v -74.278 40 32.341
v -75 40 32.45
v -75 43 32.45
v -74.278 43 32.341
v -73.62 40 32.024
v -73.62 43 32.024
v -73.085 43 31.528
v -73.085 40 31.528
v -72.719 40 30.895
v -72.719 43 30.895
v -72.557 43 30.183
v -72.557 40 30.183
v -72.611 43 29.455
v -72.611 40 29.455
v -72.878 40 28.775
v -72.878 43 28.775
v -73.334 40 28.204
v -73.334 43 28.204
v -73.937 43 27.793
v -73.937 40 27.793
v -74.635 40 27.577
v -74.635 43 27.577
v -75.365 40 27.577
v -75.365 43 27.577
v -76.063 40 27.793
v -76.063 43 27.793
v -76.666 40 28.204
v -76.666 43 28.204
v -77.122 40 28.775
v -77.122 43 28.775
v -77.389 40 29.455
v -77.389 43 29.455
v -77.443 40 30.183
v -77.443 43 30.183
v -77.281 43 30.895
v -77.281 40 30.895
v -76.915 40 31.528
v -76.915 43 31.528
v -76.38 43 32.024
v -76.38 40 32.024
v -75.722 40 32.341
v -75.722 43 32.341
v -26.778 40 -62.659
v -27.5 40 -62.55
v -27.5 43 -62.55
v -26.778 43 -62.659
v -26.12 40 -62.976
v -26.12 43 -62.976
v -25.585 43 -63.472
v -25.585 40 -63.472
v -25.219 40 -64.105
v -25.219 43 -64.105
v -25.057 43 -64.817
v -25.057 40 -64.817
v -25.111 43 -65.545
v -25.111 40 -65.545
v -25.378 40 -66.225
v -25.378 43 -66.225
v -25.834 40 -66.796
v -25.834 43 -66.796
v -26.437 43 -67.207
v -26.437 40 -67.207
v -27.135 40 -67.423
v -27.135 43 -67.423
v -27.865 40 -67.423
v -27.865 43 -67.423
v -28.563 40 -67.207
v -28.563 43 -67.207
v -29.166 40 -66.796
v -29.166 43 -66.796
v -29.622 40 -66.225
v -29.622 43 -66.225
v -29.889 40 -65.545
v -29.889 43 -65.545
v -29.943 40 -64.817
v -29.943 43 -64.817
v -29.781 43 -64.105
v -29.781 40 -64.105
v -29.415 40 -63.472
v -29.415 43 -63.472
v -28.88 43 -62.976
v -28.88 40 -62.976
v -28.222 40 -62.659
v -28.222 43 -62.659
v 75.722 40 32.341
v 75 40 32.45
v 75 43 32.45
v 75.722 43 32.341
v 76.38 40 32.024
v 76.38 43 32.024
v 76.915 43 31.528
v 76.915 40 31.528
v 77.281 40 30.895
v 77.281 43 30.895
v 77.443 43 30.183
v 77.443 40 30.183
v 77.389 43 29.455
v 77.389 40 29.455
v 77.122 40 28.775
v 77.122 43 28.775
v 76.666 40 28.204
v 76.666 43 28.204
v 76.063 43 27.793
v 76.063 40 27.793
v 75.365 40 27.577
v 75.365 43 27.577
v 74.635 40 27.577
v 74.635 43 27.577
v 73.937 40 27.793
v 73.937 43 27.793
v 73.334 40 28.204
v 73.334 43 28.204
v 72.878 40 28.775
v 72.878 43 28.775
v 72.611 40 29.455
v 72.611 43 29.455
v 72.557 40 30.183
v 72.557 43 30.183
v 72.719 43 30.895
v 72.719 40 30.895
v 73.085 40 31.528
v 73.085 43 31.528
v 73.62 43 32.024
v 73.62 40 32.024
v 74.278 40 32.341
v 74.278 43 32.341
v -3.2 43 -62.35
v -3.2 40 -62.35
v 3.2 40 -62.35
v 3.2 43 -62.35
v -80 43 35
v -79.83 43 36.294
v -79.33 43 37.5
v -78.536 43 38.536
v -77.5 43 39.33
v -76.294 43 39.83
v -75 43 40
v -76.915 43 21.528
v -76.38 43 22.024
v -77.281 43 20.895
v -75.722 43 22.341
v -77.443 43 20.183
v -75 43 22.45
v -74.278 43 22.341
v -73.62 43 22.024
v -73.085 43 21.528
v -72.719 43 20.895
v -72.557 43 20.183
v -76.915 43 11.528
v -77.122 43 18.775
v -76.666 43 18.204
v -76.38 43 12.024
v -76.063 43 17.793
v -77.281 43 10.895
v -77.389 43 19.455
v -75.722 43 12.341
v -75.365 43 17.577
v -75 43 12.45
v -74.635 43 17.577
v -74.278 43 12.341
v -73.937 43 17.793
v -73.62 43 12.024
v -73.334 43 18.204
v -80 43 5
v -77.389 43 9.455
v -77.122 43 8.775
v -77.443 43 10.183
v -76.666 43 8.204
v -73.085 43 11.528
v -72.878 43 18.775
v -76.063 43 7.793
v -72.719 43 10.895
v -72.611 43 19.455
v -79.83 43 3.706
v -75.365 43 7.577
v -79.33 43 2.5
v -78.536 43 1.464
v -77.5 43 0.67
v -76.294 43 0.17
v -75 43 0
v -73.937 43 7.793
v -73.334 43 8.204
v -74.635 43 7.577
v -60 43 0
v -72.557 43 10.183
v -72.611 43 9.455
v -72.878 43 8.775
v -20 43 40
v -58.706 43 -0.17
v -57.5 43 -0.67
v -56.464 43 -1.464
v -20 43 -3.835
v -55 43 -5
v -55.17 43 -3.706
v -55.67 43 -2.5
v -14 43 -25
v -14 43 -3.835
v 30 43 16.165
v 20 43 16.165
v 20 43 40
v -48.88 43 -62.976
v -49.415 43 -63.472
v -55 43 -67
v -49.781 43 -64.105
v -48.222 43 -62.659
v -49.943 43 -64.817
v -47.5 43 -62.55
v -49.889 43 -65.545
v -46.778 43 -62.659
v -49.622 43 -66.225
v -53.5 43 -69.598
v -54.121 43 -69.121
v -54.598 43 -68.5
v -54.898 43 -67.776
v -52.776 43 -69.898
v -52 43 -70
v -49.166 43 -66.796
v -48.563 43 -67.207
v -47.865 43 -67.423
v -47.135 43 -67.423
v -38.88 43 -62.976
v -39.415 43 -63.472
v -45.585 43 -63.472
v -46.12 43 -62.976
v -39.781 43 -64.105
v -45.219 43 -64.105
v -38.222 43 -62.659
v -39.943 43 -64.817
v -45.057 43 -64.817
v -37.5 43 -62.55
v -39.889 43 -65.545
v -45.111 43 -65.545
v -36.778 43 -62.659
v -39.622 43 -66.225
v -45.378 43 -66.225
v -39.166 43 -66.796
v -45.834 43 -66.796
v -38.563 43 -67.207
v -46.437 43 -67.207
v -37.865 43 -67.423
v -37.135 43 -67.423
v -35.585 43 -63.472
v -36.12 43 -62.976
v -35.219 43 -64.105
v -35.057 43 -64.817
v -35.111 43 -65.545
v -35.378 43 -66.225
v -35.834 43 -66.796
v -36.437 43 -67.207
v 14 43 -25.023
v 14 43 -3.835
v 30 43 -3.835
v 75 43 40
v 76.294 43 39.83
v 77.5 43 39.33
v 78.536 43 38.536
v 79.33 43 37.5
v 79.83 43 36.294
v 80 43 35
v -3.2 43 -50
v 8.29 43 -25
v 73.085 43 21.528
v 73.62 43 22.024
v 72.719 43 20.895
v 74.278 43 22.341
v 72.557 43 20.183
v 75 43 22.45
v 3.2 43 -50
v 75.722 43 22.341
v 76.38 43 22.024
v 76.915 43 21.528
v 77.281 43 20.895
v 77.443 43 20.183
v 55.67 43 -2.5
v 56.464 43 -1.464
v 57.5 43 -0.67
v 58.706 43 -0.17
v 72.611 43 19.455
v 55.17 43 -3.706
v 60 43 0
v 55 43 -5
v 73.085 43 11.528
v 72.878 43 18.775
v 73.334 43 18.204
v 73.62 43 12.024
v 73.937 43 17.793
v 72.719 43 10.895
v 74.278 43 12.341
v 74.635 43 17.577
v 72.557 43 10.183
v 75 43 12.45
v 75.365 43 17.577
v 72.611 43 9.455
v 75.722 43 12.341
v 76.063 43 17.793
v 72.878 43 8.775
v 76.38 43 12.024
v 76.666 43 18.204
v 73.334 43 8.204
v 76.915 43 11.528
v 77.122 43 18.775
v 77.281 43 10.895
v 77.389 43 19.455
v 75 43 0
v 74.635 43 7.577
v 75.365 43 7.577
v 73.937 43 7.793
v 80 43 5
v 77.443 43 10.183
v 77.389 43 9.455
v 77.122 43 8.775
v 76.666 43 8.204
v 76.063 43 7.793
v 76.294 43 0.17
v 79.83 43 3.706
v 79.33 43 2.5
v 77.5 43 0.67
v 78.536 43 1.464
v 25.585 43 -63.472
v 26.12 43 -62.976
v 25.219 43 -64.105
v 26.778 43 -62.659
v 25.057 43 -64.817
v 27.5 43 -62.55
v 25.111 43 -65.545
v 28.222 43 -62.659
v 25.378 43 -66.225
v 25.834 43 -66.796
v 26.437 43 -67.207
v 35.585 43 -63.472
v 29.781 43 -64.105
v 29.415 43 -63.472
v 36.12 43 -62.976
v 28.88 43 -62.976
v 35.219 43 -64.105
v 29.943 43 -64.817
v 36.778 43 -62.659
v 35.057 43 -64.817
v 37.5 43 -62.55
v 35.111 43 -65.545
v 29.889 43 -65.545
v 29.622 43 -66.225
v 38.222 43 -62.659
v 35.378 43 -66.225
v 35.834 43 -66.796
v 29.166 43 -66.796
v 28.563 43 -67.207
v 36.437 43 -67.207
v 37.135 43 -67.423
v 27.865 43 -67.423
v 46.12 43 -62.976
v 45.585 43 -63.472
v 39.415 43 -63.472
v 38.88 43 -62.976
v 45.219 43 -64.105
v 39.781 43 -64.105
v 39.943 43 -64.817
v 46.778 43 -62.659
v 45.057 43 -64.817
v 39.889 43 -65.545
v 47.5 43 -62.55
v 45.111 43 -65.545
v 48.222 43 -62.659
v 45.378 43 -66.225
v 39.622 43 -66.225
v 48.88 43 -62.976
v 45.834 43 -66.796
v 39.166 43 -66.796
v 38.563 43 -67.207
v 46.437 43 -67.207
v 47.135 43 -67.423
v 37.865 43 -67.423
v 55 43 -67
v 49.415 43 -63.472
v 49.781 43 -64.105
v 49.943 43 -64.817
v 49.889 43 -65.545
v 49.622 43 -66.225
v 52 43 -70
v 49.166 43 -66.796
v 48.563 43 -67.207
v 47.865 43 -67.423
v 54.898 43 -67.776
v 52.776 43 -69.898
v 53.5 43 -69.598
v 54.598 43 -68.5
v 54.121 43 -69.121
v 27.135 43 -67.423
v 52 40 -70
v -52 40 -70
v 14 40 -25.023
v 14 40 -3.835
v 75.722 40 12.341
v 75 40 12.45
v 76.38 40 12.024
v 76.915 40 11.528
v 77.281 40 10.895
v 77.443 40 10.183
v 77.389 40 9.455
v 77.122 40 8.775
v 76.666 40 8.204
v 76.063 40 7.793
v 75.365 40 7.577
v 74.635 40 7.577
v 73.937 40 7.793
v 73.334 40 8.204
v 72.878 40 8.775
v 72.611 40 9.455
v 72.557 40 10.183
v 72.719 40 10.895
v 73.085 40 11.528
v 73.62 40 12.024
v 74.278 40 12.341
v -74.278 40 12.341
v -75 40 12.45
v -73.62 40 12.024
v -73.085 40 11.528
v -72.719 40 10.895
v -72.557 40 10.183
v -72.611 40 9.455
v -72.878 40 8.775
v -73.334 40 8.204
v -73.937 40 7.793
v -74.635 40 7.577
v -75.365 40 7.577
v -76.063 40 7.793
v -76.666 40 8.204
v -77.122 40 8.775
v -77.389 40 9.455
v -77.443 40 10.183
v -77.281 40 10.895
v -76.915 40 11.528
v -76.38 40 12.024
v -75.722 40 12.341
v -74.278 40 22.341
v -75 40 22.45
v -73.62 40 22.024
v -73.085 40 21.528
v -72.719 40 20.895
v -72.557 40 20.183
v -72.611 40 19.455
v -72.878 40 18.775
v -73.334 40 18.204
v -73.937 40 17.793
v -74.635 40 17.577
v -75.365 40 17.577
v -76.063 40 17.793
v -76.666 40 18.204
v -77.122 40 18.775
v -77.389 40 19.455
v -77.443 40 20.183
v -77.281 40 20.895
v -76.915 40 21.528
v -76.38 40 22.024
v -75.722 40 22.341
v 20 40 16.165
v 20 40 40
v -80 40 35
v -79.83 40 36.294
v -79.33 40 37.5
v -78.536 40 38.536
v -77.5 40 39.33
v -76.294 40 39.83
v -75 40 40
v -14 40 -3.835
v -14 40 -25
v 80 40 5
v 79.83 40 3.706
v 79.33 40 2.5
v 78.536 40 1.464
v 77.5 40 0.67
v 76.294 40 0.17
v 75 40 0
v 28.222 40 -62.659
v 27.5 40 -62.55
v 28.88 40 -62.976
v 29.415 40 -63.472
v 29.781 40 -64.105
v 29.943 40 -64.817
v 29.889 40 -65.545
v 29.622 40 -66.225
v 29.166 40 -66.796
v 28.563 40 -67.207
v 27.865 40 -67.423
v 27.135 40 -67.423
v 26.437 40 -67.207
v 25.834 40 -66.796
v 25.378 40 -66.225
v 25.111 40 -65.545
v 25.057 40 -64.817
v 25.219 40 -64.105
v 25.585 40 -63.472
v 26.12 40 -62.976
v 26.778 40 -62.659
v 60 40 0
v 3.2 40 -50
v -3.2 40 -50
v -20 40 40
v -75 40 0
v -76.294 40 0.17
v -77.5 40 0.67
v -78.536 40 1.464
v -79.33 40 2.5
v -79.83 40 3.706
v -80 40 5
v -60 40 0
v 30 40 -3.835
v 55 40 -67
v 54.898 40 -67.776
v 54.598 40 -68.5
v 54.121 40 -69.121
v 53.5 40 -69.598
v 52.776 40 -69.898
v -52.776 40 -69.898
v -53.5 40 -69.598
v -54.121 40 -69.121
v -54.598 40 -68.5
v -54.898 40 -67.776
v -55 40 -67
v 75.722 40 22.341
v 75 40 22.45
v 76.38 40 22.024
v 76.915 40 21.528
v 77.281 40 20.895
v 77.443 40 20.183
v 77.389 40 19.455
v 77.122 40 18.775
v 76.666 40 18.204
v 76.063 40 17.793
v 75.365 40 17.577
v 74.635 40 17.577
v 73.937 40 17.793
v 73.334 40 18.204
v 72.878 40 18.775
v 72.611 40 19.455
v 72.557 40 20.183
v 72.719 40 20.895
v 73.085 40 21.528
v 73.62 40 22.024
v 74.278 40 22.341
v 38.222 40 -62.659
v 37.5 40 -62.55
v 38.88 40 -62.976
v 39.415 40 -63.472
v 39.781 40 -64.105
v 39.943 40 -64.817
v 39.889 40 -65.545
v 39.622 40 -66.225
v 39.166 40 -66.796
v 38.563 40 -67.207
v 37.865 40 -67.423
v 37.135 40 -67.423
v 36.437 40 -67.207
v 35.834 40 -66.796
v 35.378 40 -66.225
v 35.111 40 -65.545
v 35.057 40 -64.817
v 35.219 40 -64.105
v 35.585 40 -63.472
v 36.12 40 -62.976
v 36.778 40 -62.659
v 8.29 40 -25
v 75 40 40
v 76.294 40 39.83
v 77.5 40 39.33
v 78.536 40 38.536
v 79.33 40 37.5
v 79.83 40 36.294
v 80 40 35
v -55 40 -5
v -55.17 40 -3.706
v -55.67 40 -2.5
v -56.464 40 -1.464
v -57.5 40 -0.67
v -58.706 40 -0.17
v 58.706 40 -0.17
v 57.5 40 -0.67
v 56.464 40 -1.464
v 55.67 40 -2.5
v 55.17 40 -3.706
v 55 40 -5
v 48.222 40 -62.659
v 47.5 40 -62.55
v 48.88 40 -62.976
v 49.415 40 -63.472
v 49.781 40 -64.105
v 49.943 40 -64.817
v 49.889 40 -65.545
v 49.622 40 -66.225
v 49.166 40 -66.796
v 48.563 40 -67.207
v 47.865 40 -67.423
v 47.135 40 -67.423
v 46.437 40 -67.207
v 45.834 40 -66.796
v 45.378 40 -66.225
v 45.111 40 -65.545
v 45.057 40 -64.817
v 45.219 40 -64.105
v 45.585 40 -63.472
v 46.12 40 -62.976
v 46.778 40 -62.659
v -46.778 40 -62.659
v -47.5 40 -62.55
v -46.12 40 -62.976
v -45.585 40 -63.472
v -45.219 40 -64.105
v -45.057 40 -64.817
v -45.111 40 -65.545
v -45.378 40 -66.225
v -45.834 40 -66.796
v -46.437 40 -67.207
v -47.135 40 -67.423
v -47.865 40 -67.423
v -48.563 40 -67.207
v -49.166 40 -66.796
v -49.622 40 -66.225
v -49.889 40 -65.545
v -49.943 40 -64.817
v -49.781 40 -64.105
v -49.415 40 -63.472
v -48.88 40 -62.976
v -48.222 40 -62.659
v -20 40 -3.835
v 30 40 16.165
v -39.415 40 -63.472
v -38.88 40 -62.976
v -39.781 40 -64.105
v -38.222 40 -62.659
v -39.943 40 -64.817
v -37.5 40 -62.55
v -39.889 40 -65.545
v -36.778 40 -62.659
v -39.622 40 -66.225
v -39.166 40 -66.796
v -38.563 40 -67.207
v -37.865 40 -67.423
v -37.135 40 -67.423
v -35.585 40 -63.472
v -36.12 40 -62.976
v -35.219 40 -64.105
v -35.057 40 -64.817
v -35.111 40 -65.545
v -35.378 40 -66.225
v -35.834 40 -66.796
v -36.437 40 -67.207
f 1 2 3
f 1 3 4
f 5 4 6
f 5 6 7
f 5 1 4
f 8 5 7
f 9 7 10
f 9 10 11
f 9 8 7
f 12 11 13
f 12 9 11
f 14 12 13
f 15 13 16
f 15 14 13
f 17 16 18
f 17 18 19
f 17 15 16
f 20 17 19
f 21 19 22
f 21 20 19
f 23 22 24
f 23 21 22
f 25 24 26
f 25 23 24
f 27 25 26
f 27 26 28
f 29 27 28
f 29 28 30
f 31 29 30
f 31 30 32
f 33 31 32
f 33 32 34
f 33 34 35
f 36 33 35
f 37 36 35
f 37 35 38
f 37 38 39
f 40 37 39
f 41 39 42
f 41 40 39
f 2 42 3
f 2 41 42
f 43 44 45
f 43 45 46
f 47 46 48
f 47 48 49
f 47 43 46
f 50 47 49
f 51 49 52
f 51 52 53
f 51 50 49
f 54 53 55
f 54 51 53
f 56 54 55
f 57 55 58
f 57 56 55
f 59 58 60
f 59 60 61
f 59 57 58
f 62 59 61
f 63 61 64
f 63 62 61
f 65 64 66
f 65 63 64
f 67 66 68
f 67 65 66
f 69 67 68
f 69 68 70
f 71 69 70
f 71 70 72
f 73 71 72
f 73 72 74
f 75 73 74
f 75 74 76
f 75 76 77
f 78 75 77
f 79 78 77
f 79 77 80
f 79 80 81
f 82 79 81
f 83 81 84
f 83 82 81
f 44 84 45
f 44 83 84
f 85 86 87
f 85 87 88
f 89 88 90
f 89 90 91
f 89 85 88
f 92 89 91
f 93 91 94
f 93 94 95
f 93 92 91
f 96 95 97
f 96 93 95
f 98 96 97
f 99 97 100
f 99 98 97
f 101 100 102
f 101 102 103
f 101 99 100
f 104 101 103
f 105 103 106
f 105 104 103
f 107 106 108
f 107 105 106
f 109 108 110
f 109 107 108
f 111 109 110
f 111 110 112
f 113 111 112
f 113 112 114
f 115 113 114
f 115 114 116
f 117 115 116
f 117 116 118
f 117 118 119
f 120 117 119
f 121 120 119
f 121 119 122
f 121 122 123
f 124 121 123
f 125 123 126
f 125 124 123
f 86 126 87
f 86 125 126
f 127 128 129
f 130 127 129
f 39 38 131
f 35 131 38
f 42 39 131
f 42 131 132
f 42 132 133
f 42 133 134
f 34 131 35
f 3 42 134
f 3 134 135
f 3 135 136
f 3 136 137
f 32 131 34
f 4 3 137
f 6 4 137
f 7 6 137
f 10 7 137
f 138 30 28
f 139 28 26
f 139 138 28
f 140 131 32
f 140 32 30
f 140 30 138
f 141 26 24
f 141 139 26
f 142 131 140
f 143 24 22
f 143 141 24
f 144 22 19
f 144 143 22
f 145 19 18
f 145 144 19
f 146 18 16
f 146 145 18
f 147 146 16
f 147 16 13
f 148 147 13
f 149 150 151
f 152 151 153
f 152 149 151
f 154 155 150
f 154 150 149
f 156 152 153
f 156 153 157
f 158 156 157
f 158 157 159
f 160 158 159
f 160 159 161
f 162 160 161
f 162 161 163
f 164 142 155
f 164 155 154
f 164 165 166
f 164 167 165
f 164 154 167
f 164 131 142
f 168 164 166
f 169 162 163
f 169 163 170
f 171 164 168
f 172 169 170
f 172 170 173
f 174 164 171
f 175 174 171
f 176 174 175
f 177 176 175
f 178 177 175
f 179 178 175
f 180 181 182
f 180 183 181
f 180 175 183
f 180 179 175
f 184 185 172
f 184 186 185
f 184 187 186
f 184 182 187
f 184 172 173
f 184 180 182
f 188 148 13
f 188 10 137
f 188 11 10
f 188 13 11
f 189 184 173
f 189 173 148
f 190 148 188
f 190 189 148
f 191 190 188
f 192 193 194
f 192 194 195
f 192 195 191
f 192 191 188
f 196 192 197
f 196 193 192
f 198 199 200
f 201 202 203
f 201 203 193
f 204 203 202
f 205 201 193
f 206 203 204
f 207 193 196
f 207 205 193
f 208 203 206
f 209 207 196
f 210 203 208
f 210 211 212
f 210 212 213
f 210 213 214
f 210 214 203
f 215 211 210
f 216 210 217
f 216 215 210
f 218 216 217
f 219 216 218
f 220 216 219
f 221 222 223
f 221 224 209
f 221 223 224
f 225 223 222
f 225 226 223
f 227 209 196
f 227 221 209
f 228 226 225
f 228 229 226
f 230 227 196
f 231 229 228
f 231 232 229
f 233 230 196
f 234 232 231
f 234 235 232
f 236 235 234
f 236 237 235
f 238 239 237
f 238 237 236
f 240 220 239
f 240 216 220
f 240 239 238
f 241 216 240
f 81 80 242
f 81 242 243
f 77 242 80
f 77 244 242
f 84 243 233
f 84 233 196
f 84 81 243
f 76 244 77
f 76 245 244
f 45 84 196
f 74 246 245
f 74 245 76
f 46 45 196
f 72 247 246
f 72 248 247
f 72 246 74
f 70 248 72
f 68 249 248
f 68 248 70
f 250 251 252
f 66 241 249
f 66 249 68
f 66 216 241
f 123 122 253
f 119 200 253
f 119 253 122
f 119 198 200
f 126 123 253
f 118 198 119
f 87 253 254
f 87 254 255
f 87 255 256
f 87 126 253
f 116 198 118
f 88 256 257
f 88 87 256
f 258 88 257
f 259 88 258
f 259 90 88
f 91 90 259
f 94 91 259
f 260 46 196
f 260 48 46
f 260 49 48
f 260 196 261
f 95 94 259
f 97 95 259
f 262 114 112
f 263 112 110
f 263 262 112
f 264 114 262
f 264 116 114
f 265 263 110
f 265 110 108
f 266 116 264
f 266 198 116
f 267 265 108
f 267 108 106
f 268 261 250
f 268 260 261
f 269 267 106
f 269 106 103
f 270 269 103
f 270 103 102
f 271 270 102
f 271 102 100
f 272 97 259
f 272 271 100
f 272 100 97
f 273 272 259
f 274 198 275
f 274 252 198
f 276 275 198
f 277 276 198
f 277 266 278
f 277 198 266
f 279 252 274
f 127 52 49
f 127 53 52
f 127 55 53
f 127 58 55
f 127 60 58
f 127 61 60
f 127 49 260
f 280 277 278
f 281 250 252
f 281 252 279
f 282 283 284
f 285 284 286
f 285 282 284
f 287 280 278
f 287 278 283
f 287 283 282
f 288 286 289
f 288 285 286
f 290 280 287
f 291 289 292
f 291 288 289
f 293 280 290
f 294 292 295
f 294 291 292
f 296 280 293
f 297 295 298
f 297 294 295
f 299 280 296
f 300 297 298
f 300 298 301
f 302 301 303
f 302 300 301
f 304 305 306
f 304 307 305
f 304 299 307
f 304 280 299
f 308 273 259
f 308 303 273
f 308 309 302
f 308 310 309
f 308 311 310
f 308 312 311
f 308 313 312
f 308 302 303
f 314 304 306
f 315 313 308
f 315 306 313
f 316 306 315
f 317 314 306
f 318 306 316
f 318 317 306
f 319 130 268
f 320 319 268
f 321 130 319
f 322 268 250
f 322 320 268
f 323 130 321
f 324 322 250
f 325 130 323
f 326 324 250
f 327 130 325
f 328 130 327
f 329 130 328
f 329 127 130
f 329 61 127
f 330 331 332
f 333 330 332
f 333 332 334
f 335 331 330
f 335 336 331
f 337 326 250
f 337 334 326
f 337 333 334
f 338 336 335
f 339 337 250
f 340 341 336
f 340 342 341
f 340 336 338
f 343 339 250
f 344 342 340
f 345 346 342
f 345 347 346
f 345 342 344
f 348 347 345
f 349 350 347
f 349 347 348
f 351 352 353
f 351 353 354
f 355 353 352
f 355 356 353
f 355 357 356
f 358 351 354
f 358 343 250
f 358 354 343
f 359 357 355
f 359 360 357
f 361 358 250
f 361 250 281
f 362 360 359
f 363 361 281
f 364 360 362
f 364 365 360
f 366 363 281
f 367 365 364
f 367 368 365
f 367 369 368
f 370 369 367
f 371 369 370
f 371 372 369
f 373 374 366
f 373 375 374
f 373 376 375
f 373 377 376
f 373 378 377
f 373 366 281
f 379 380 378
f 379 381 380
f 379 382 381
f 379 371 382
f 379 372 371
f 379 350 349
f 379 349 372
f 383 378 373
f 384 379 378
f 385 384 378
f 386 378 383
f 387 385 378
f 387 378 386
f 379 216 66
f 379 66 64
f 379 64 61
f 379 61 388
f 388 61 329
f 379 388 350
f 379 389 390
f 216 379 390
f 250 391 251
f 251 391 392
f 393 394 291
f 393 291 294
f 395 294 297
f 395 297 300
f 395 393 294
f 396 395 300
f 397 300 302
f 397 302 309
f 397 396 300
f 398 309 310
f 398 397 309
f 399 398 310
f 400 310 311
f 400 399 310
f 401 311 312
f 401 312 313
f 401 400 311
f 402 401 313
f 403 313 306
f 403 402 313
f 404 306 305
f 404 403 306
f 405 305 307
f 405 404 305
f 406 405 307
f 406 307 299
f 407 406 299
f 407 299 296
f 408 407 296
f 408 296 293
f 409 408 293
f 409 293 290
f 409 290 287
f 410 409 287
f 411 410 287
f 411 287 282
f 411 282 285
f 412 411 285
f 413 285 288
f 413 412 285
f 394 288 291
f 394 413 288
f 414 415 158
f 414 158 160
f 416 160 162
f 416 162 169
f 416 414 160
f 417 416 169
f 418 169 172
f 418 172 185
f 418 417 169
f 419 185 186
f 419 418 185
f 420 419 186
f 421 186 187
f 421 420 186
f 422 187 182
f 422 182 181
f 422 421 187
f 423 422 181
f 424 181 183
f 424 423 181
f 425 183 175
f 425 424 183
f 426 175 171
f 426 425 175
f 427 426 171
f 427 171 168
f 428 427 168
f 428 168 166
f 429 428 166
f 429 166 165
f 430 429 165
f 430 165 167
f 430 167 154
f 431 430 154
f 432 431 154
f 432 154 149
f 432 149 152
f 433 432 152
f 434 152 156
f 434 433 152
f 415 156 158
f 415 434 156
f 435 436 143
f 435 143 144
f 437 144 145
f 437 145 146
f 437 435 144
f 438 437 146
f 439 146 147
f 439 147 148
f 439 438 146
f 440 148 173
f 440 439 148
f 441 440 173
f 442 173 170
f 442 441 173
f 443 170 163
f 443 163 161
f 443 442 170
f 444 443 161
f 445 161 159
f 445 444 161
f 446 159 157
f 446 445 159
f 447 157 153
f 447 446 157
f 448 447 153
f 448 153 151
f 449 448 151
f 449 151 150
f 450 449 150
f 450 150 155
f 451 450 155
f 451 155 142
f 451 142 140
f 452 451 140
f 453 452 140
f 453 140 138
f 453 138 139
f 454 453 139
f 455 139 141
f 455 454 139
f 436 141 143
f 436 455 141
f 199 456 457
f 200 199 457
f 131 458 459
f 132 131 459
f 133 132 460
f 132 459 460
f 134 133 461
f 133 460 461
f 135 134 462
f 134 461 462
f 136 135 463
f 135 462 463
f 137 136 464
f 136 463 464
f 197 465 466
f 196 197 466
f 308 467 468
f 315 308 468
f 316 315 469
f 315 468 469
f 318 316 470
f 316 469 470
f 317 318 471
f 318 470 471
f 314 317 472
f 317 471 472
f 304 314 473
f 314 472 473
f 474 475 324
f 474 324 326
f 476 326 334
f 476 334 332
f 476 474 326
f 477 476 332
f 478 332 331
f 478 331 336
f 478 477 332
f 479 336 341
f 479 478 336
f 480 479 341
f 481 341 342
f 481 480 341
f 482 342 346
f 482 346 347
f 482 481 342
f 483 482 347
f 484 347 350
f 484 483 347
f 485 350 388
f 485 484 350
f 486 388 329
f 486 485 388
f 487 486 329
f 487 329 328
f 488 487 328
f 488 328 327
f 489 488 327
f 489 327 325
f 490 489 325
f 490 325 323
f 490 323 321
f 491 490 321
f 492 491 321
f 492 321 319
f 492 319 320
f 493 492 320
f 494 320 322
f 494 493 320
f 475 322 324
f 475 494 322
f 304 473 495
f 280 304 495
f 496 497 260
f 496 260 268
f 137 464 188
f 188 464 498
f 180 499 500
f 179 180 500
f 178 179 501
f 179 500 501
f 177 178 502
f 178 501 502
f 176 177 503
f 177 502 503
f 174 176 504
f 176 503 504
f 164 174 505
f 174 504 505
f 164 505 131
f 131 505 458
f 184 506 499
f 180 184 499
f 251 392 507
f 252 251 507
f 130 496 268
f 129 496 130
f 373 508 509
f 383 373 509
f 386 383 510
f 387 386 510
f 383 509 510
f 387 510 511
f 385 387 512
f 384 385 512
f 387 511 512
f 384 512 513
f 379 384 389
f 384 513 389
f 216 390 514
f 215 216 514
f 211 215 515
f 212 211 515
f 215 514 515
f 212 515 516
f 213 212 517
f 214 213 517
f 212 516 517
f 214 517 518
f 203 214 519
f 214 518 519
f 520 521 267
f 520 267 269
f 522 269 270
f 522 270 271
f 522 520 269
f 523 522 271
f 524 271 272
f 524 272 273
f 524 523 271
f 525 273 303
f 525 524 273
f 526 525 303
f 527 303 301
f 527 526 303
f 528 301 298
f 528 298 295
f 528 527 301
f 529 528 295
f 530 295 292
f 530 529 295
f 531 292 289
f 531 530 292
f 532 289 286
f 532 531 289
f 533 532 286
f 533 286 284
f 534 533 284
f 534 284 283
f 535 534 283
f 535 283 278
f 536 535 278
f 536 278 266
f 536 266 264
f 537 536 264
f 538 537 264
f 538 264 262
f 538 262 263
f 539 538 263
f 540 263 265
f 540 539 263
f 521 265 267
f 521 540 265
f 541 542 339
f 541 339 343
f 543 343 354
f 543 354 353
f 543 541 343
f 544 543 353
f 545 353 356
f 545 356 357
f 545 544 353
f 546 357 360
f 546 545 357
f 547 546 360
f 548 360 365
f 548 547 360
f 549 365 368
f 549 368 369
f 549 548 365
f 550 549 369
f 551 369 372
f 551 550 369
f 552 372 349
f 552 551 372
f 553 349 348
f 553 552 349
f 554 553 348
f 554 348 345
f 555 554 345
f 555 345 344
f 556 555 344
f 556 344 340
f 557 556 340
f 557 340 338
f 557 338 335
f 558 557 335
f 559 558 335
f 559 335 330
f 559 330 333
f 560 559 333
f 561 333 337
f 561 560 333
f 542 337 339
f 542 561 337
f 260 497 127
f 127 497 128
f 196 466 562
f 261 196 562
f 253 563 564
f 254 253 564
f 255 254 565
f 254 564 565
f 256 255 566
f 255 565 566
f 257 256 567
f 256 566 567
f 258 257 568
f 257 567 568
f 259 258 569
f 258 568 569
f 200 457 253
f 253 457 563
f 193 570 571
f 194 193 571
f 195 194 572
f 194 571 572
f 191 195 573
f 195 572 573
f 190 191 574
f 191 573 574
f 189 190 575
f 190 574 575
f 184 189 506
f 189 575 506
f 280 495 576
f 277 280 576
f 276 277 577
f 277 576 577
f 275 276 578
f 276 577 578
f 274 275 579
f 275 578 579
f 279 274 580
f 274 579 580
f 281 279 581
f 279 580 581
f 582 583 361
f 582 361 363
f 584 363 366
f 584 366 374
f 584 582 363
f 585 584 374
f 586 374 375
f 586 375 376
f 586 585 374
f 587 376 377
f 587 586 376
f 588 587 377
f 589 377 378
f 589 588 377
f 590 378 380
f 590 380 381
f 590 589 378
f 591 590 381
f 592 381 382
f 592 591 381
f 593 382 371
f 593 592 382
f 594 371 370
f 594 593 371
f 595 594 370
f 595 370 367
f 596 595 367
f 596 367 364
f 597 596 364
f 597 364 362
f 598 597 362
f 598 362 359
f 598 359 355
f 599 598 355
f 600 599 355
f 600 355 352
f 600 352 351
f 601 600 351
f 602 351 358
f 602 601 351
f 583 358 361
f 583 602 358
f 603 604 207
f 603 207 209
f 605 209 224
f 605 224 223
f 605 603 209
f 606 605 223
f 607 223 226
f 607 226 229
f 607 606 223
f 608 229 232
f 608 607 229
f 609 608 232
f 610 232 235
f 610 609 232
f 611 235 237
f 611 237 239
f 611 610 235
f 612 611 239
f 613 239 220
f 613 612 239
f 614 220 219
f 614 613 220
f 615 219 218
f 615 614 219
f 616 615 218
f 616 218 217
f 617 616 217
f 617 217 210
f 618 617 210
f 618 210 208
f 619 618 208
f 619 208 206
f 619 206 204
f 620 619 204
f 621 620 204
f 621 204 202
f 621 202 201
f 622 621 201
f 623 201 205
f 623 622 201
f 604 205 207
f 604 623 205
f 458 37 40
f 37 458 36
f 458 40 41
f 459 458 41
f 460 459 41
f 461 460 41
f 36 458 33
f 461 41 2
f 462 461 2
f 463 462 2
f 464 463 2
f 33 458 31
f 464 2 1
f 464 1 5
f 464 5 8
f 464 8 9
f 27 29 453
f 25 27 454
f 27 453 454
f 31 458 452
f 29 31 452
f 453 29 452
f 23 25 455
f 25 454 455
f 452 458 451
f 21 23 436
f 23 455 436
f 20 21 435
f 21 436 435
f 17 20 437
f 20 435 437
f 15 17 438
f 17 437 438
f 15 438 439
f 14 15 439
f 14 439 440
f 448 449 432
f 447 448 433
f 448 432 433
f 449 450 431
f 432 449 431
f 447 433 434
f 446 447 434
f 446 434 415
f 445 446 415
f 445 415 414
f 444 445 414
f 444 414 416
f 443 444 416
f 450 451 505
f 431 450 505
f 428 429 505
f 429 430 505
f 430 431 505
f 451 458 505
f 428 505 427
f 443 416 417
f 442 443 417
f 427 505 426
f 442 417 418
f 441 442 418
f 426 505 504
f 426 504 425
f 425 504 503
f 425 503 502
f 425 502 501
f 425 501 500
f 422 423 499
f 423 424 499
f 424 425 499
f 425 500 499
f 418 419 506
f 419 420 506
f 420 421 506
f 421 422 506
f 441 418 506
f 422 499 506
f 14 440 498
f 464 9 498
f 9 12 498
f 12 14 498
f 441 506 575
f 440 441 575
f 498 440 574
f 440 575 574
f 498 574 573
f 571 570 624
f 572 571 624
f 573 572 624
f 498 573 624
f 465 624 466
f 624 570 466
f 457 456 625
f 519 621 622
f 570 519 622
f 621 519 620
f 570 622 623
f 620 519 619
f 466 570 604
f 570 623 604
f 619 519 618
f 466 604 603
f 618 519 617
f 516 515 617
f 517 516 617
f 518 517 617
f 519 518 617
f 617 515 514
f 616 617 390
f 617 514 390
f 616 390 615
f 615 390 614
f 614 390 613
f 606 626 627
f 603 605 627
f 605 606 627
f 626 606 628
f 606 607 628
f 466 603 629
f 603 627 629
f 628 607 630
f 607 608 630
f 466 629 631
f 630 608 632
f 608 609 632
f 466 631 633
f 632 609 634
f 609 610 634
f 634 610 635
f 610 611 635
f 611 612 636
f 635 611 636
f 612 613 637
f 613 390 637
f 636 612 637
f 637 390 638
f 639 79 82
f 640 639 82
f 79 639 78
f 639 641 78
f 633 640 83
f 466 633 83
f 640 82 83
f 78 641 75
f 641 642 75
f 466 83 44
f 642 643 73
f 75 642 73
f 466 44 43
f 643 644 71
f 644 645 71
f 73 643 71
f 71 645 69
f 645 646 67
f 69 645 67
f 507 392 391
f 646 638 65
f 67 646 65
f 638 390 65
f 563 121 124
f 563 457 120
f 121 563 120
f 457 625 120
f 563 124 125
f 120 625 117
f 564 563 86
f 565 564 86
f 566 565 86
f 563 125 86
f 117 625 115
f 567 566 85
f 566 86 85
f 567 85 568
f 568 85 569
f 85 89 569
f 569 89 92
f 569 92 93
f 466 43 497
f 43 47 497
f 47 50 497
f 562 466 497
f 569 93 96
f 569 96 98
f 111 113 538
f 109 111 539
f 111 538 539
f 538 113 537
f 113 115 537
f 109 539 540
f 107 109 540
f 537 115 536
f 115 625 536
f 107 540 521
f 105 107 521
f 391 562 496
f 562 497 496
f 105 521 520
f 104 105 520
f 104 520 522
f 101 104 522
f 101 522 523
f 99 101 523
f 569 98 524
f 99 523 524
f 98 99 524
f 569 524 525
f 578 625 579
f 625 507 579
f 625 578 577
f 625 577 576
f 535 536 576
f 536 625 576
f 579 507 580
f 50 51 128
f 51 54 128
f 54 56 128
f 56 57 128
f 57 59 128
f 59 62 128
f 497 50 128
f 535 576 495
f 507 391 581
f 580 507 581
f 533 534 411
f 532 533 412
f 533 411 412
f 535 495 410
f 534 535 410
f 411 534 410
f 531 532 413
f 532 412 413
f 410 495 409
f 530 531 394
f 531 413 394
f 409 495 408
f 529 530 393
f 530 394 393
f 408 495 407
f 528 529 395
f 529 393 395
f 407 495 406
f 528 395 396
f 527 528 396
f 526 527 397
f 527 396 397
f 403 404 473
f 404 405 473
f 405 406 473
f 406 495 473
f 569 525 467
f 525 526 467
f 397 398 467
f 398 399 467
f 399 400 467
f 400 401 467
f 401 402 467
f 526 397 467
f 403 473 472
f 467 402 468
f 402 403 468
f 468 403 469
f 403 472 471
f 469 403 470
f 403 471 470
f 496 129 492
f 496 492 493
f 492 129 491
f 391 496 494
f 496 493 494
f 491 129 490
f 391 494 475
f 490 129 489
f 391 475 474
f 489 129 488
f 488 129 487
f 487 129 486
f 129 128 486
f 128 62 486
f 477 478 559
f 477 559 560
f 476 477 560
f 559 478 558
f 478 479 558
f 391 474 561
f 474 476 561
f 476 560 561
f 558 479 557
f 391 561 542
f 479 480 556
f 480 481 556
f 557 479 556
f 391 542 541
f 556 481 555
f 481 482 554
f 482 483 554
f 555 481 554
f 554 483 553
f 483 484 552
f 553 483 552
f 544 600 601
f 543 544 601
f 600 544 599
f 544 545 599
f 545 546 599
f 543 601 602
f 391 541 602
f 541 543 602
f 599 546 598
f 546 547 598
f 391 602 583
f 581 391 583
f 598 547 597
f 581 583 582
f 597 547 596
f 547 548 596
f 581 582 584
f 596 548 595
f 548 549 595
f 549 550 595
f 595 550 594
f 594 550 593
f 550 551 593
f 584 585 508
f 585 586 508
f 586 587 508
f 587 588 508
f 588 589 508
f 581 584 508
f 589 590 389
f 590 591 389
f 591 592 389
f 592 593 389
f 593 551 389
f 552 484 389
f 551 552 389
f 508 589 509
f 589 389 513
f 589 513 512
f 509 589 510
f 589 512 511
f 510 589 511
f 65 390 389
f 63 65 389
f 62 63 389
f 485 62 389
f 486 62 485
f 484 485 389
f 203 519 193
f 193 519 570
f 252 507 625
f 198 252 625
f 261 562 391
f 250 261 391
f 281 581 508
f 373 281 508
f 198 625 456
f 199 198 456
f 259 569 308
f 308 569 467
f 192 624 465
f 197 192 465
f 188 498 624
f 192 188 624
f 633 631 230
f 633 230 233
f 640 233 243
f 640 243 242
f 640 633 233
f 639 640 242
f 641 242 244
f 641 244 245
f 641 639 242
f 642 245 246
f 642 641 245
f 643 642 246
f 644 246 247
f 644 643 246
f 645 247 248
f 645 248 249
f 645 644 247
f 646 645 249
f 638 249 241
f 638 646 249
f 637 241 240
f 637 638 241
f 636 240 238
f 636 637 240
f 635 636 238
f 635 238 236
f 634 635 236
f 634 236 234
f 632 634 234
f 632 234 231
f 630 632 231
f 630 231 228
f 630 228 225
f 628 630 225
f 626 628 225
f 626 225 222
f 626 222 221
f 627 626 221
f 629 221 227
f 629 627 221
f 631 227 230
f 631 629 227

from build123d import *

# Parameters (mm, degrees)
SKETCH2_W           = 6.4
SKETCH2_H           = 12.35
SKETCH2_R           = 2.45
BOSS_EXTRUDE1_DEPTH = 3


with BuildPart() as part:
    # Sketch2 → Boss-Extrude1 (new body)
    with BuildSketch(Plane(origin=(0, 40, 0), x_dir=(1, 0, 0), z_dir=(0, 1, 0))):
        with BuildLine():
            Line((30, -16.164928148), (20, -16.164928148))
            Line((20, -16.164928148), (20, -40))
            Line((20, -40), (75, -40))
            ThreePointArc((75, -40), (78.535533906, -38.535533906), (80, -35))
            Line((80, -35), (80, -5))
            ThreePointArc((80, -5), (78.535533906, -1.464466094), (75, 0))
            Line((75, 0), (60, 0))
            ThreePointArc((60, 0), (56.464466094, 1.464466094), (55, 5))
            Line((55, 5), (55, 67))
            ThreePointArc((55, 67), (54.121320344, 69.121320344), (52, 70))
            Line((52, 70), (-52, 70))
            ThreePointArc((-52, 70), (-54.121320344, 69.121320344), (-55, 67))
            Line((-55, 67), (-55, 5))
            ThreePointArc((-55, 5), (-56.464466094, 1.464466094), (-60, 0))
            Line((-60, 0), (-75, 0))
            ThreePointArc((-75, 0), (-78.535533906, -1.464466094), (-80, -5))
            Line((-80, -5), (-80, -35))
            ThreePointArc((-80, -35), (-78.535533906, -38.535533906), (-75, -40))
            Line((-75, -40), (-20, -40))
            Line((-20, -40), (-20, 3.835071852))
            Line((-20, 3.835071852), (-14, 3.835071852))
            Line((-14, 3.835071852), (-14, 25))
            Line((-14, 25), (8.289849185, 25))
            Line((8.289849185, 25), (14, 25.022996562))
            Line((14, 25.022996562), (14, 3.835071852))
            Line((14, 3.835071852), (30, 3.835071852))
            Line((30, 3.835071852), (30, -16.164928148))
        make_face()
        with Locations((0, 56.175)):
            Rectangle(SKETCH2_W, SKETCH2_H, mode=Mode.SUBTRACT)
        with Locations(Location((-75, -30, 0), (0, 0, 270))):
            Circle(SKETCH2_R, mode=Mode.SUBTRACT)
        with Locations(Location((-75, -20, 0), (0, 0, 270))):
            Circle(SKETCH2_R, mode=Mode.SUBTRACT)
        with Locations(Location((-75, -10, 0), (0, 0, 270))):
            Circle(SKETCH2_R, mode=Mode.SUBTRACT)
        with Locations(Location((75, -30, 0), (0, 0, 270))):
            Circle(SKETCH2_R, mode=Mode.SUBTRACT)
        with Locations(Location((75, -20, 0), (0, 0, 270))):
            Circle(SKETCH2_R, mode=Mode.SUBTRACT)
        with Locations(Location((75, -10, 0), (0, 0, 270))):
            Circle(SKETCH2_R, mode=Mode.SUBTRACT)
        with Locations(Location((-47.5, 65, 0), (0, 0, 270))):
            Circle(SKETCH2_R, mode=Mode.SUBTRACT)
        with Locations(Location((-37.5, 65, 0), (0, 0, 270))):
            Circle(SKETCH2_R, mode=Mode.SUBTRACT)
        with Locations(Location((-27.5, 65, 0), (0, 0, 270))):
            Circle(SKETCH2_R, mode=Mode.SUBTRACT)
        with Locations(Location((27.5, 65, 0), (0, 0, 270))):
            Circle(SKETCH2_R, mode=Mode.SUBTRACT)
        with Locations(Location((37.5, 65, 0), (0, 0, 270))):
            Circle(SKETCH2_R, mode=Mode.SUBTRACT)
        with Locations(Location((47.5, 65, 0), (0, 0, 270))):
            Circle(SKETCH2_R, mode=Mode.SUBTRACT)
    extrude(amount=BOSS_EXTRUDE1_DEPTH)


solid = part.part
